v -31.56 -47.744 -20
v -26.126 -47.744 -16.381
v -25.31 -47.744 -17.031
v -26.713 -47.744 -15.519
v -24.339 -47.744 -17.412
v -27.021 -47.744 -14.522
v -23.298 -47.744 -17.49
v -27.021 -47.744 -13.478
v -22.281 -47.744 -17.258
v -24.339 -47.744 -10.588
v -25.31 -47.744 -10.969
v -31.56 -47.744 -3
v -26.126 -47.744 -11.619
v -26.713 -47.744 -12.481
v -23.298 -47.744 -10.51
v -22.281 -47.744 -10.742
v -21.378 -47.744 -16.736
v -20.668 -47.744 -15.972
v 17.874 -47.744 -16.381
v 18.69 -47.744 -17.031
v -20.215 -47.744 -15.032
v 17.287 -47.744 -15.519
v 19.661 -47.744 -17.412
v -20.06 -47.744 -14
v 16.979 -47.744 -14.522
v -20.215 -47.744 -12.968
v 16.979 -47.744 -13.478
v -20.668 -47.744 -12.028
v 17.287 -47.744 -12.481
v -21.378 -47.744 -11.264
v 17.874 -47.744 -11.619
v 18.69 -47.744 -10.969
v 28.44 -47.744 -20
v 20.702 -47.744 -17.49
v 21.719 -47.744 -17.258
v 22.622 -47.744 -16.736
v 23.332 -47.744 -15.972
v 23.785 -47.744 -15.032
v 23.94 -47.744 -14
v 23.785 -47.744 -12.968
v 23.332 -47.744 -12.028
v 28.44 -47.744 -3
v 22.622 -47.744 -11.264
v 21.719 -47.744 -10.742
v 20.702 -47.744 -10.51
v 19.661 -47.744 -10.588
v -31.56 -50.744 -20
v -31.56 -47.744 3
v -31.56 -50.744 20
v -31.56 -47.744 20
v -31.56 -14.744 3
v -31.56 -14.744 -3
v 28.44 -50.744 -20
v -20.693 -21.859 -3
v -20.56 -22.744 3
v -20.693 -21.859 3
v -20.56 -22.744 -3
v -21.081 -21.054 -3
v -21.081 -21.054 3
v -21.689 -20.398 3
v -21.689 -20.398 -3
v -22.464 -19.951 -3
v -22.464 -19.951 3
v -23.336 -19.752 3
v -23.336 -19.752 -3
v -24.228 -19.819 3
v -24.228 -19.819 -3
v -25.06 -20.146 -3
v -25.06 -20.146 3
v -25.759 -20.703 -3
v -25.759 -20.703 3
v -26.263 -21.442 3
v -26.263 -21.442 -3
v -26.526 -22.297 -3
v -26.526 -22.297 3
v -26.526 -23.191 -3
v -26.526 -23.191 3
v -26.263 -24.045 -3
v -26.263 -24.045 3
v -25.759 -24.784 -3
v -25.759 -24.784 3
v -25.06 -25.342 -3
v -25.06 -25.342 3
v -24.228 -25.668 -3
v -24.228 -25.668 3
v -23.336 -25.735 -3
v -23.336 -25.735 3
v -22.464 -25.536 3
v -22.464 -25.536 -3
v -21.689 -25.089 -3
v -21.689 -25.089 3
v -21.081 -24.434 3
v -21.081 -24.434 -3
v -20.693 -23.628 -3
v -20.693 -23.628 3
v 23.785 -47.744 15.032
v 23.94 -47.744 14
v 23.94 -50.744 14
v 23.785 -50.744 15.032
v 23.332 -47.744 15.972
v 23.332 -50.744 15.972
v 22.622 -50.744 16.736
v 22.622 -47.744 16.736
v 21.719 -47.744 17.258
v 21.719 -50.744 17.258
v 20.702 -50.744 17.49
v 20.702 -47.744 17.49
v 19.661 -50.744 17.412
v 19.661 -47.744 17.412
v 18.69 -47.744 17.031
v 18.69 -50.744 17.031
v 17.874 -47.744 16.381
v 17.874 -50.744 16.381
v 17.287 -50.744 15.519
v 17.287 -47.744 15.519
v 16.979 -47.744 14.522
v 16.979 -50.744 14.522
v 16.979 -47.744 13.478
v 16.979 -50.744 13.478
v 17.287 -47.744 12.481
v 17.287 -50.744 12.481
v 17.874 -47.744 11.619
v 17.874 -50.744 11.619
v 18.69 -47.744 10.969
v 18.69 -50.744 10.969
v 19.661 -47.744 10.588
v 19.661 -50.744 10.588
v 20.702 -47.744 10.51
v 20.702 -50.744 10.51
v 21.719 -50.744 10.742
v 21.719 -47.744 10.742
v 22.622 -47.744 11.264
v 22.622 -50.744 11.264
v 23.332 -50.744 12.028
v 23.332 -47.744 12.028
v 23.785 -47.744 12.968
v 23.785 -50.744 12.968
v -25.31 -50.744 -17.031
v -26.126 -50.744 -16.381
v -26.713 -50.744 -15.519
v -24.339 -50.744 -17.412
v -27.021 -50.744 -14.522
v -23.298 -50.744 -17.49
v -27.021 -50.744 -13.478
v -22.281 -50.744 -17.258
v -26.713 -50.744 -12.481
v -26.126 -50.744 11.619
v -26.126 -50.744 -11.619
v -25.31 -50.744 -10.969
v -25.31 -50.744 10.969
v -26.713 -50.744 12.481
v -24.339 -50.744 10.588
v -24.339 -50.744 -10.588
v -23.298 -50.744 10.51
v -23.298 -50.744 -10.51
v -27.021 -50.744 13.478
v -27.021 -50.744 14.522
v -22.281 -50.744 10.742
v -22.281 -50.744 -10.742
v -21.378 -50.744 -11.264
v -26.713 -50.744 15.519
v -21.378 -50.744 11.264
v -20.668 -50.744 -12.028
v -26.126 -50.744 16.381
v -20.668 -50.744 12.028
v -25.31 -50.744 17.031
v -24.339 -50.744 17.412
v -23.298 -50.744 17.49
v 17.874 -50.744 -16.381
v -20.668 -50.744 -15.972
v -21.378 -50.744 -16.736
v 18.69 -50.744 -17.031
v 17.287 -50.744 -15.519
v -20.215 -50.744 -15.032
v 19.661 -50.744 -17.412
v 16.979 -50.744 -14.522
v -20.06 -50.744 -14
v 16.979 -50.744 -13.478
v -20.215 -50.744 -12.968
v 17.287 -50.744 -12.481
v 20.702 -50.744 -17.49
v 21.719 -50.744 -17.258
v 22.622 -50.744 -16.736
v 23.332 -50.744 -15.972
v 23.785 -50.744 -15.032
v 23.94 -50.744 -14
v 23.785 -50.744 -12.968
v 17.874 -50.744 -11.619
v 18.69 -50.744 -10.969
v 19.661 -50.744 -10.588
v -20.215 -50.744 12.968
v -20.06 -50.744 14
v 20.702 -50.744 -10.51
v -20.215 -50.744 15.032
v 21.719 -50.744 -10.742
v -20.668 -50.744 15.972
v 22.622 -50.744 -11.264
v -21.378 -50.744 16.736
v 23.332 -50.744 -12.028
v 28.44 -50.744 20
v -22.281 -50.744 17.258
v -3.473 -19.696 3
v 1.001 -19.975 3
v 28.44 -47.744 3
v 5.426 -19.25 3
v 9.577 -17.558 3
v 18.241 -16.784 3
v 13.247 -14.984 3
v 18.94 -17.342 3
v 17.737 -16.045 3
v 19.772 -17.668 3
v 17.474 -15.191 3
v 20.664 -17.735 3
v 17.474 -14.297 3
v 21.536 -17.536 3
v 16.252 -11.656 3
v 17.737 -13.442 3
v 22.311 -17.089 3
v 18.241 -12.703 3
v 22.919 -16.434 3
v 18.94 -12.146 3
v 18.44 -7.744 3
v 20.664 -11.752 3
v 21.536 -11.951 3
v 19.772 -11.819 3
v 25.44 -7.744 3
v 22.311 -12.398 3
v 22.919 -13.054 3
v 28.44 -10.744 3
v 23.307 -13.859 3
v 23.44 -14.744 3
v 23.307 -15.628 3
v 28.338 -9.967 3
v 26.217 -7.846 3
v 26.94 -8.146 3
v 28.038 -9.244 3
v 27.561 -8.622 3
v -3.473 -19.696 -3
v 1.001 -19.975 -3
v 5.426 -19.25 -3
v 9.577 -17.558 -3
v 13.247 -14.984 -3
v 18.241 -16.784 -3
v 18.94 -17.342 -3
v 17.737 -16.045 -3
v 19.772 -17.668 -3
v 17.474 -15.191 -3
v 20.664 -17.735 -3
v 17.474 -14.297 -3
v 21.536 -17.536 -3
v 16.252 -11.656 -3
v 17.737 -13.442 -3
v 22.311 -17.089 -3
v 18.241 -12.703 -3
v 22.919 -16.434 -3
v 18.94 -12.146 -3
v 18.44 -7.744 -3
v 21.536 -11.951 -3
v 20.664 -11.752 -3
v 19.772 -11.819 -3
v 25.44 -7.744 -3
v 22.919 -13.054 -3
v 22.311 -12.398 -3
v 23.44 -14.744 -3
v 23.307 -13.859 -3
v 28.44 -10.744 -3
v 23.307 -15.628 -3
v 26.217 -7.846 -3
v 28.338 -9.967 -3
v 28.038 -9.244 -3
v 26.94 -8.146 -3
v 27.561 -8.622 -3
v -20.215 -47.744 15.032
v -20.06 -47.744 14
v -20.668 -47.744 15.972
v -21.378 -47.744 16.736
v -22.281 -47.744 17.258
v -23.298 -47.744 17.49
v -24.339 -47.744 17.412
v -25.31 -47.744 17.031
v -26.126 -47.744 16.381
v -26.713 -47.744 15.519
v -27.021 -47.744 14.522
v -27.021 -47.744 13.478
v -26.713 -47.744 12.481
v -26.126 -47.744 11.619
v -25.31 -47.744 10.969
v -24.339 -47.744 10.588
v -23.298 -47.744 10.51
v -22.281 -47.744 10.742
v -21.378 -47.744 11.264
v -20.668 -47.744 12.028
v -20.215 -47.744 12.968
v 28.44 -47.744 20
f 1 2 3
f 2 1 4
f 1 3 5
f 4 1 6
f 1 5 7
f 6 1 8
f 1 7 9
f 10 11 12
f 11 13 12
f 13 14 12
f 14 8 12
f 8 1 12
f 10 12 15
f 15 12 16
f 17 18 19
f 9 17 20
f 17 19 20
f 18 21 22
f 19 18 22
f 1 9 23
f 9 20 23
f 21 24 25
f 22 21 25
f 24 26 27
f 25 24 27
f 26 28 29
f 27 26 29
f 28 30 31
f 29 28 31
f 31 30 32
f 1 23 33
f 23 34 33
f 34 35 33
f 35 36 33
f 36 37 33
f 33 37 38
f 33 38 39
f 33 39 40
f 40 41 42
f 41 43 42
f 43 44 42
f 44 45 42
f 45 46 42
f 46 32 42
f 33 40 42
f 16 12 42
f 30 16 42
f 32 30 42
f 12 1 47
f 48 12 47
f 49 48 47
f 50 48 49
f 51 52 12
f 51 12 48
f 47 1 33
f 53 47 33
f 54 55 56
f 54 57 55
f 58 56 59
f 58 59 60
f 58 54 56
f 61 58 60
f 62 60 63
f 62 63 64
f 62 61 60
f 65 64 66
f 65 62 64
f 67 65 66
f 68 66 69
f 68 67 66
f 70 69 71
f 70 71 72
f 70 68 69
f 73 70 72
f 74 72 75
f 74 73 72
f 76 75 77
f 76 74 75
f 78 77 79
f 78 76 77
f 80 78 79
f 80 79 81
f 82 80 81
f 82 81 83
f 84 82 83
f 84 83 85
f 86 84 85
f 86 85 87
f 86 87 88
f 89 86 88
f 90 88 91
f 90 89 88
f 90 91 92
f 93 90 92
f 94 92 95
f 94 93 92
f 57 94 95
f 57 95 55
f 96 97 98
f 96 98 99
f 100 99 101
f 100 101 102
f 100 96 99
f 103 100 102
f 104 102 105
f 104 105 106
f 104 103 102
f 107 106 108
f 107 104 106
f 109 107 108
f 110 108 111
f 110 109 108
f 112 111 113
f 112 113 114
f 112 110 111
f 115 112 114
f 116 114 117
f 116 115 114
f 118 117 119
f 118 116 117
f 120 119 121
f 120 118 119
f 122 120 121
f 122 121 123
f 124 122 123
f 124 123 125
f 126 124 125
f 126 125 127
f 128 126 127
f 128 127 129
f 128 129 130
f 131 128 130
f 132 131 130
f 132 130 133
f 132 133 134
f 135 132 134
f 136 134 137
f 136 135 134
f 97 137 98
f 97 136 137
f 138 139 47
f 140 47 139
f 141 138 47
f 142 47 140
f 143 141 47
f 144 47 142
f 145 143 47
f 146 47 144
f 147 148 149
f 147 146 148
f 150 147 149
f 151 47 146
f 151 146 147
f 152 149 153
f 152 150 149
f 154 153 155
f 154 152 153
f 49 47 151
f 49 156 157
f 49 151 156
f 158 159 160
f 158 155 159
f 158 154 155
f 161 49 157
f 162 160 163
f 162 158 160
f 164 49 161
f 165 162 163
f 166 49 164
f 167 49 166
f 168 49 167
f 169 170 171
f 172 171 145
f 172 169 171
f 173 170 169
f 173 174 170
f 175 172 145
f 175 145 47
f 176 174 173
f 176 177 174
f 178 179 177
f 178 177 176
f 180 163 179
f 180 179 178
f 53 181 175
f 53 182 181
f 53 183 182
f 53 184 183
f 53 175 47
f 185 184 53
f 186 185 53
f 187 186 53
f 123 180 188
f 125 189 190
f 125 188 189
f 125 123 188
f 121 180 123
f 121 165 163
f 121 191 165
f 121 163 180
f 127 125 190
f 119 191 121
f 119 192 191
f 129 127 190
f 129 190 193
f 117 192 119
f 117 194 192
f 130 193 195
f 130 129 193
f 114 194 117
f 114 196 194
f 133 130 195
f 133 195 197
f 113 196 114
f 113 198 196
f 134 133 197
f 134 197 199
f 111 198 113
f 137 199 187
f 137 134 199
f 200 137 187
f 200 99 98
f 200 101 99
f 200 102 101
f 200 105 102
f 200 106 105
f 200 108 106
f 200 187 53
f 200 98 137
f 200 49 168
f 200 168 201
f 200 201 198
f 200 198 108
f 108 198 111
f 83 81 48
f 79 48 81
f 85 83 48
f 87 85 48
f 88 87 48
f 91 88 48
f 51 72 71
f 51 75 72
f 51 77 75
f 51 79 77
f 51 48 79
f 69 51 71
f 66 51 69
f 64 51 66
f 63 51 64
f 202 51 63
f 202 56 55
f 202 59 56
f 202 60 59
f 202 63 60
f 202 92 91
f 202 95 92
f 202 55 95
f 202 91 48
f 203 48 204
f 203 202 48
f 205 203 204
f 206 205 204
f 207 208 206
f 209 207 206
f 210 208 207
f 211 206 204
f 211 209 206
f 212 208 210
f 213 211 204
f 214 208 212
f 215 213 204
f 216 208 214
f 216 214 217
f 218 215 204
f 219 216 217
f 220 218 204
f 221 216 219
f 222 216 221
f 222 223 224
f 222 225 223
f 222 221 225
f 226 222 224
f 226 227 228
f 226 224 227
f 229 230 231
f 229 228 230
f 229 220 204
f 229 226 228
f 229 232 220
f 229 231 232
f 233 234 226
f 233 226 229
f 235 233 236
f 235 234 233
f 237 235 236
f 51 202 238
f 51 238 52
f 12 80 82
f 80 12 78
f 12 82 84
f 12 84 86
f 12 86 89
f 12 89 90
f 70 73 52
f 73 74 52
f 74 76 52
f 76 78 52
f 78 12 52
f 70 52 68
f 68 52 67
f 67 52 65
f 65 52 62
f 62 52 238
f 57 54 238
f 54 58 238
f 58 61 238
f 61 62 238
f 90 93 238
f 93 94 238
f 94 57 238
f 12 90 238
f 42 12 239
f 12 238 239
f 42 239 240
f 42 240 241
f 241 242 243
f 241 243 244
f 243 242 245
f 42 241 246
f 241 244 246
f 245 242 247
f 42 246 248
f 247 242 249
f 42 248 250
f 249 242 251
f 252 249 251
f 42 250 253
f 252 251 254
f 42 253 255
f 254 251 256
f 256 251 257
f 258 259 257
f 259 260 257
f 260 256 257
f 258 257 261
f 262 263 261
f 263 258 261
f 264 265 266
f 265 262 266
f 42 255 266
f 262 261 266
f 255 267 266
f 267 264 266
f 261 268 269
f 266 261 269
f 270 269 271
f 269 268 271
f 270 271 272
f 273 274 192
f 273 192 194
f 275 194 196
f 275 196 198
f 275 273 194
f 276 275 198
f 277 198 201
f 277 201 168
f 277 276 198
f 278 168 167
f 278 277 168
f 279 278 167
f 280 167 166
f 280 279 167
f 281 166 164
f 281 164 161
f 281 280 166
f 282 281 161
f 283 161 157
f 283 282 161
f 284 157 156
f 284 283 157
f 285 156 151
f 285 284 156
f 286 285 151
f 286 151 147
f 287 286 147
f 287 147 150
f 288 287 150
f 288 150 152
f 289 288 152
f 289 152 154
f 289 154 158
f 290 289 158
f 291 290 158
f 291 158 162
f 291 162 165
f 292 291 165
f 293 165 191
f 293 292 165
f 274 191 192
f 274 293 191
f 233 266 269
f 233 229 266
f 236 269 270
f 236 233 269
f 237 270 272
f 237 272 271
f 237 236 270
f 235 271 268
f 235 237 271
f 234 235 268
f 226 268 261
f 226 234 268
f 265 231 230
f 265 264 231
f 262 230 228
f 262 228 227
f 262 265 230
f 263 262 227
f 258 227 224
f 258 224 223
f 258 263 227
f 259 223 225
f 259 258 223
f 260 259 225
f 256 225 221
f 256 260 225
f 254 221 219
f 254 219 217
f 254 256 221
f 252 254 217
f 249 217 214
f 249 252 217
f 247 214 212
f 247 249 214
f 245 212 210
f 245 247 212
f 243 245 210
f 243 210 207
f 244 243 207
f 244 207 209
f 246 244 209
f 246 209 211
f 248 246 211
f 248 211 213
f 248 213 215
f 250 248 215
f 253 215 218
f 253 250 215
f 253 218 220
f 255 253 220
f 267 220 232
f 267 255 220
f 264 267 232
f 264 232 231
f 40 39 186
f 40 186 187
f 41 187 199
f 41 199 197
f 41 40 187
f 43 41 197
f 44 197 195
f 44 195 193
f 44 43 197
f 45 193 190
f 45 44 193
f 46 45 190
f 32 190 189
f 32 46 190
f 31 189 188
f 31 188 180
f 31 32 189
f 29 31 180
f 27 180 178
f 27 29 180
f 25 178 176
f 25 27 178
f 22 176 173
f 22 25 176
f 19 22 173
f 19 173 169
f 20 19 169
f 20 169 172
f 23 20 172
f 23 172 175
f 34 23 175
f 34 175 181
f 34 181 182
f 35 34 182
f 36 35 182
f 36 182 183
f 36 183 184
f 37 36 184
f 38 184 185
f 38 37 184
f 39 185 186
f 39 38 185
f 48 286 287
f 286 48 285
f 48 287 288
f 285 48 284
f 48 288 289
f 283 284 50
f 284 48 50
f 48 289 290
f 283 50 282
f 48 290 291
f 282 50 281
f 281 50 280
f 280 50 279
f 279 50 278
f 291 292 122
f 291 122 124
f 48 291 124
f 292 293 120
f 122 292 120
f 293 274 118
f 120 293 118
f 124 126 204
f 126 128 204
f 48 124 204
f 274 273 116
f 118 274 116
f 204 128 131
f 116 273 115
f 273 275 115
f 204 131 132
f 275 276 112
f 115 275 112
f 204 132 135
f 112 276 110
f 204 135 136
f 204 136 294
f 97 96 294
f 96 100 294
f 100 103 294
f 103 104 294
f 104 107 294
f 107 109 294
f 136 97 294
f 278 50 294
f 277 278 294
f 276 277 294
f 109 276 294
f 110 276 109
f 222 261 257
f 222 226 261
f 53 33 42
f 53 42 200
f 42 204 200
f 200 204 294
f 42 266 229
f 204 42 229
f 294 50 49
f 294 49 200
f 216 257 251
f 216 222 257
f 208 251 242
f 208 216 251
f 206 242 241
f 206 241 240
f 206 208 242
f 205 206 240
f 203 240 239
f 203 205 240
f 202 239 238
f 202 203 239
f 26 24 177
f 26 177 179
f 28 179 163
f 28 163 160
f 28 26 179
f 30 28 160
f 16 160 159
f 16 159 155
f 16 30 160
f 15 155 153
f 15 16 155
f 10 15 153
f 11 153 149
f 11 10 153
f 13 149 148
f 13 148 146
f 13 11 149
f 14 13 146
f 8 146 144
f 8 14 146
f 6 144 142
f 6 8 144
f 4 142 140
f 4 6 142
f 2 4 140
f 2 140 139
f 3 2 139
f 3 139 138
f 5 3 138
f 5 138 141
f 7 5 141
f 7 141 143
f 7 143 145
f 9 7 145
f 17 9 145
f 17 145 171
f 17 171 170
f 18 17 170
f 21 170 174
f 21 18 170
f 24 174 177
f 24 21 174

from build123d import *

# Parameters (mm, degrees)
F0_R     = 3
F1_DEPTH = 3
F2_W     = 60
F2_H     = 40
F2_R     = 3.5
F3_DEPTH = 3


with BuildPart() as f1:
    # F0 (on Top) → F1 (new body, symmetric)
    with BuildSketch(Plane.XY):
        with BuildLine():
            ThreePointArc((18.440057, -7.743663), (9.577003, -17.557933), (-3.472964, -19.696155))
            Line((-3.472964, -19.696155), (-31.559943, -14.743663))
            Line((-31.559943, -14.743663), (-31.559943, -47.743663))
            Line((-31.559943, -47.743663), (28.440057, -47.743663))
            Line((28.440057, -47.743663), (28.440057, -10.743663))
            ThreePointArc((28.440057, -10.743663), (27.561377, -8.622342), (25.440057, -7.743663))
            Line((25.440057, -7.743663), (18.440057, -7.743663))
        make_face()
        with Locations((-23.559943, -22.743663)):
            Circle(F0_R, mode=Mode.SUBTRACT)
        with Locations((20.440057, -14.743663)):
            Circle(F0_R, mode=Mode.SUBTRACT)
    extrude(amount=F1_DEPTH, both=True)

    # F2 (on face) → F3 (join)
    with BuildSketch(Plane.XZ.offset(47.743663)):
        with Locations((-1.559943, 0)):
            Rectangle(F2_W, F2_H)
        with Locations((-23.559943, -14)):
            Circle(F2_R, mode=Mode.SUBTRACT)
        with Locations((20.440057, -14)):
            Circle(F2_R, mode=Mode.SUBTRACT)
        with Locations((-23.559943, 14)):
            Circle(F2_R, mode=Mode.SUBTRACT)
        with Locations((20.440057, 14)):
            Circle(F2_R, mode=Mode.SUBTRACT)
    extrude(amount=F3_DEPTH)


solid = f1.part
